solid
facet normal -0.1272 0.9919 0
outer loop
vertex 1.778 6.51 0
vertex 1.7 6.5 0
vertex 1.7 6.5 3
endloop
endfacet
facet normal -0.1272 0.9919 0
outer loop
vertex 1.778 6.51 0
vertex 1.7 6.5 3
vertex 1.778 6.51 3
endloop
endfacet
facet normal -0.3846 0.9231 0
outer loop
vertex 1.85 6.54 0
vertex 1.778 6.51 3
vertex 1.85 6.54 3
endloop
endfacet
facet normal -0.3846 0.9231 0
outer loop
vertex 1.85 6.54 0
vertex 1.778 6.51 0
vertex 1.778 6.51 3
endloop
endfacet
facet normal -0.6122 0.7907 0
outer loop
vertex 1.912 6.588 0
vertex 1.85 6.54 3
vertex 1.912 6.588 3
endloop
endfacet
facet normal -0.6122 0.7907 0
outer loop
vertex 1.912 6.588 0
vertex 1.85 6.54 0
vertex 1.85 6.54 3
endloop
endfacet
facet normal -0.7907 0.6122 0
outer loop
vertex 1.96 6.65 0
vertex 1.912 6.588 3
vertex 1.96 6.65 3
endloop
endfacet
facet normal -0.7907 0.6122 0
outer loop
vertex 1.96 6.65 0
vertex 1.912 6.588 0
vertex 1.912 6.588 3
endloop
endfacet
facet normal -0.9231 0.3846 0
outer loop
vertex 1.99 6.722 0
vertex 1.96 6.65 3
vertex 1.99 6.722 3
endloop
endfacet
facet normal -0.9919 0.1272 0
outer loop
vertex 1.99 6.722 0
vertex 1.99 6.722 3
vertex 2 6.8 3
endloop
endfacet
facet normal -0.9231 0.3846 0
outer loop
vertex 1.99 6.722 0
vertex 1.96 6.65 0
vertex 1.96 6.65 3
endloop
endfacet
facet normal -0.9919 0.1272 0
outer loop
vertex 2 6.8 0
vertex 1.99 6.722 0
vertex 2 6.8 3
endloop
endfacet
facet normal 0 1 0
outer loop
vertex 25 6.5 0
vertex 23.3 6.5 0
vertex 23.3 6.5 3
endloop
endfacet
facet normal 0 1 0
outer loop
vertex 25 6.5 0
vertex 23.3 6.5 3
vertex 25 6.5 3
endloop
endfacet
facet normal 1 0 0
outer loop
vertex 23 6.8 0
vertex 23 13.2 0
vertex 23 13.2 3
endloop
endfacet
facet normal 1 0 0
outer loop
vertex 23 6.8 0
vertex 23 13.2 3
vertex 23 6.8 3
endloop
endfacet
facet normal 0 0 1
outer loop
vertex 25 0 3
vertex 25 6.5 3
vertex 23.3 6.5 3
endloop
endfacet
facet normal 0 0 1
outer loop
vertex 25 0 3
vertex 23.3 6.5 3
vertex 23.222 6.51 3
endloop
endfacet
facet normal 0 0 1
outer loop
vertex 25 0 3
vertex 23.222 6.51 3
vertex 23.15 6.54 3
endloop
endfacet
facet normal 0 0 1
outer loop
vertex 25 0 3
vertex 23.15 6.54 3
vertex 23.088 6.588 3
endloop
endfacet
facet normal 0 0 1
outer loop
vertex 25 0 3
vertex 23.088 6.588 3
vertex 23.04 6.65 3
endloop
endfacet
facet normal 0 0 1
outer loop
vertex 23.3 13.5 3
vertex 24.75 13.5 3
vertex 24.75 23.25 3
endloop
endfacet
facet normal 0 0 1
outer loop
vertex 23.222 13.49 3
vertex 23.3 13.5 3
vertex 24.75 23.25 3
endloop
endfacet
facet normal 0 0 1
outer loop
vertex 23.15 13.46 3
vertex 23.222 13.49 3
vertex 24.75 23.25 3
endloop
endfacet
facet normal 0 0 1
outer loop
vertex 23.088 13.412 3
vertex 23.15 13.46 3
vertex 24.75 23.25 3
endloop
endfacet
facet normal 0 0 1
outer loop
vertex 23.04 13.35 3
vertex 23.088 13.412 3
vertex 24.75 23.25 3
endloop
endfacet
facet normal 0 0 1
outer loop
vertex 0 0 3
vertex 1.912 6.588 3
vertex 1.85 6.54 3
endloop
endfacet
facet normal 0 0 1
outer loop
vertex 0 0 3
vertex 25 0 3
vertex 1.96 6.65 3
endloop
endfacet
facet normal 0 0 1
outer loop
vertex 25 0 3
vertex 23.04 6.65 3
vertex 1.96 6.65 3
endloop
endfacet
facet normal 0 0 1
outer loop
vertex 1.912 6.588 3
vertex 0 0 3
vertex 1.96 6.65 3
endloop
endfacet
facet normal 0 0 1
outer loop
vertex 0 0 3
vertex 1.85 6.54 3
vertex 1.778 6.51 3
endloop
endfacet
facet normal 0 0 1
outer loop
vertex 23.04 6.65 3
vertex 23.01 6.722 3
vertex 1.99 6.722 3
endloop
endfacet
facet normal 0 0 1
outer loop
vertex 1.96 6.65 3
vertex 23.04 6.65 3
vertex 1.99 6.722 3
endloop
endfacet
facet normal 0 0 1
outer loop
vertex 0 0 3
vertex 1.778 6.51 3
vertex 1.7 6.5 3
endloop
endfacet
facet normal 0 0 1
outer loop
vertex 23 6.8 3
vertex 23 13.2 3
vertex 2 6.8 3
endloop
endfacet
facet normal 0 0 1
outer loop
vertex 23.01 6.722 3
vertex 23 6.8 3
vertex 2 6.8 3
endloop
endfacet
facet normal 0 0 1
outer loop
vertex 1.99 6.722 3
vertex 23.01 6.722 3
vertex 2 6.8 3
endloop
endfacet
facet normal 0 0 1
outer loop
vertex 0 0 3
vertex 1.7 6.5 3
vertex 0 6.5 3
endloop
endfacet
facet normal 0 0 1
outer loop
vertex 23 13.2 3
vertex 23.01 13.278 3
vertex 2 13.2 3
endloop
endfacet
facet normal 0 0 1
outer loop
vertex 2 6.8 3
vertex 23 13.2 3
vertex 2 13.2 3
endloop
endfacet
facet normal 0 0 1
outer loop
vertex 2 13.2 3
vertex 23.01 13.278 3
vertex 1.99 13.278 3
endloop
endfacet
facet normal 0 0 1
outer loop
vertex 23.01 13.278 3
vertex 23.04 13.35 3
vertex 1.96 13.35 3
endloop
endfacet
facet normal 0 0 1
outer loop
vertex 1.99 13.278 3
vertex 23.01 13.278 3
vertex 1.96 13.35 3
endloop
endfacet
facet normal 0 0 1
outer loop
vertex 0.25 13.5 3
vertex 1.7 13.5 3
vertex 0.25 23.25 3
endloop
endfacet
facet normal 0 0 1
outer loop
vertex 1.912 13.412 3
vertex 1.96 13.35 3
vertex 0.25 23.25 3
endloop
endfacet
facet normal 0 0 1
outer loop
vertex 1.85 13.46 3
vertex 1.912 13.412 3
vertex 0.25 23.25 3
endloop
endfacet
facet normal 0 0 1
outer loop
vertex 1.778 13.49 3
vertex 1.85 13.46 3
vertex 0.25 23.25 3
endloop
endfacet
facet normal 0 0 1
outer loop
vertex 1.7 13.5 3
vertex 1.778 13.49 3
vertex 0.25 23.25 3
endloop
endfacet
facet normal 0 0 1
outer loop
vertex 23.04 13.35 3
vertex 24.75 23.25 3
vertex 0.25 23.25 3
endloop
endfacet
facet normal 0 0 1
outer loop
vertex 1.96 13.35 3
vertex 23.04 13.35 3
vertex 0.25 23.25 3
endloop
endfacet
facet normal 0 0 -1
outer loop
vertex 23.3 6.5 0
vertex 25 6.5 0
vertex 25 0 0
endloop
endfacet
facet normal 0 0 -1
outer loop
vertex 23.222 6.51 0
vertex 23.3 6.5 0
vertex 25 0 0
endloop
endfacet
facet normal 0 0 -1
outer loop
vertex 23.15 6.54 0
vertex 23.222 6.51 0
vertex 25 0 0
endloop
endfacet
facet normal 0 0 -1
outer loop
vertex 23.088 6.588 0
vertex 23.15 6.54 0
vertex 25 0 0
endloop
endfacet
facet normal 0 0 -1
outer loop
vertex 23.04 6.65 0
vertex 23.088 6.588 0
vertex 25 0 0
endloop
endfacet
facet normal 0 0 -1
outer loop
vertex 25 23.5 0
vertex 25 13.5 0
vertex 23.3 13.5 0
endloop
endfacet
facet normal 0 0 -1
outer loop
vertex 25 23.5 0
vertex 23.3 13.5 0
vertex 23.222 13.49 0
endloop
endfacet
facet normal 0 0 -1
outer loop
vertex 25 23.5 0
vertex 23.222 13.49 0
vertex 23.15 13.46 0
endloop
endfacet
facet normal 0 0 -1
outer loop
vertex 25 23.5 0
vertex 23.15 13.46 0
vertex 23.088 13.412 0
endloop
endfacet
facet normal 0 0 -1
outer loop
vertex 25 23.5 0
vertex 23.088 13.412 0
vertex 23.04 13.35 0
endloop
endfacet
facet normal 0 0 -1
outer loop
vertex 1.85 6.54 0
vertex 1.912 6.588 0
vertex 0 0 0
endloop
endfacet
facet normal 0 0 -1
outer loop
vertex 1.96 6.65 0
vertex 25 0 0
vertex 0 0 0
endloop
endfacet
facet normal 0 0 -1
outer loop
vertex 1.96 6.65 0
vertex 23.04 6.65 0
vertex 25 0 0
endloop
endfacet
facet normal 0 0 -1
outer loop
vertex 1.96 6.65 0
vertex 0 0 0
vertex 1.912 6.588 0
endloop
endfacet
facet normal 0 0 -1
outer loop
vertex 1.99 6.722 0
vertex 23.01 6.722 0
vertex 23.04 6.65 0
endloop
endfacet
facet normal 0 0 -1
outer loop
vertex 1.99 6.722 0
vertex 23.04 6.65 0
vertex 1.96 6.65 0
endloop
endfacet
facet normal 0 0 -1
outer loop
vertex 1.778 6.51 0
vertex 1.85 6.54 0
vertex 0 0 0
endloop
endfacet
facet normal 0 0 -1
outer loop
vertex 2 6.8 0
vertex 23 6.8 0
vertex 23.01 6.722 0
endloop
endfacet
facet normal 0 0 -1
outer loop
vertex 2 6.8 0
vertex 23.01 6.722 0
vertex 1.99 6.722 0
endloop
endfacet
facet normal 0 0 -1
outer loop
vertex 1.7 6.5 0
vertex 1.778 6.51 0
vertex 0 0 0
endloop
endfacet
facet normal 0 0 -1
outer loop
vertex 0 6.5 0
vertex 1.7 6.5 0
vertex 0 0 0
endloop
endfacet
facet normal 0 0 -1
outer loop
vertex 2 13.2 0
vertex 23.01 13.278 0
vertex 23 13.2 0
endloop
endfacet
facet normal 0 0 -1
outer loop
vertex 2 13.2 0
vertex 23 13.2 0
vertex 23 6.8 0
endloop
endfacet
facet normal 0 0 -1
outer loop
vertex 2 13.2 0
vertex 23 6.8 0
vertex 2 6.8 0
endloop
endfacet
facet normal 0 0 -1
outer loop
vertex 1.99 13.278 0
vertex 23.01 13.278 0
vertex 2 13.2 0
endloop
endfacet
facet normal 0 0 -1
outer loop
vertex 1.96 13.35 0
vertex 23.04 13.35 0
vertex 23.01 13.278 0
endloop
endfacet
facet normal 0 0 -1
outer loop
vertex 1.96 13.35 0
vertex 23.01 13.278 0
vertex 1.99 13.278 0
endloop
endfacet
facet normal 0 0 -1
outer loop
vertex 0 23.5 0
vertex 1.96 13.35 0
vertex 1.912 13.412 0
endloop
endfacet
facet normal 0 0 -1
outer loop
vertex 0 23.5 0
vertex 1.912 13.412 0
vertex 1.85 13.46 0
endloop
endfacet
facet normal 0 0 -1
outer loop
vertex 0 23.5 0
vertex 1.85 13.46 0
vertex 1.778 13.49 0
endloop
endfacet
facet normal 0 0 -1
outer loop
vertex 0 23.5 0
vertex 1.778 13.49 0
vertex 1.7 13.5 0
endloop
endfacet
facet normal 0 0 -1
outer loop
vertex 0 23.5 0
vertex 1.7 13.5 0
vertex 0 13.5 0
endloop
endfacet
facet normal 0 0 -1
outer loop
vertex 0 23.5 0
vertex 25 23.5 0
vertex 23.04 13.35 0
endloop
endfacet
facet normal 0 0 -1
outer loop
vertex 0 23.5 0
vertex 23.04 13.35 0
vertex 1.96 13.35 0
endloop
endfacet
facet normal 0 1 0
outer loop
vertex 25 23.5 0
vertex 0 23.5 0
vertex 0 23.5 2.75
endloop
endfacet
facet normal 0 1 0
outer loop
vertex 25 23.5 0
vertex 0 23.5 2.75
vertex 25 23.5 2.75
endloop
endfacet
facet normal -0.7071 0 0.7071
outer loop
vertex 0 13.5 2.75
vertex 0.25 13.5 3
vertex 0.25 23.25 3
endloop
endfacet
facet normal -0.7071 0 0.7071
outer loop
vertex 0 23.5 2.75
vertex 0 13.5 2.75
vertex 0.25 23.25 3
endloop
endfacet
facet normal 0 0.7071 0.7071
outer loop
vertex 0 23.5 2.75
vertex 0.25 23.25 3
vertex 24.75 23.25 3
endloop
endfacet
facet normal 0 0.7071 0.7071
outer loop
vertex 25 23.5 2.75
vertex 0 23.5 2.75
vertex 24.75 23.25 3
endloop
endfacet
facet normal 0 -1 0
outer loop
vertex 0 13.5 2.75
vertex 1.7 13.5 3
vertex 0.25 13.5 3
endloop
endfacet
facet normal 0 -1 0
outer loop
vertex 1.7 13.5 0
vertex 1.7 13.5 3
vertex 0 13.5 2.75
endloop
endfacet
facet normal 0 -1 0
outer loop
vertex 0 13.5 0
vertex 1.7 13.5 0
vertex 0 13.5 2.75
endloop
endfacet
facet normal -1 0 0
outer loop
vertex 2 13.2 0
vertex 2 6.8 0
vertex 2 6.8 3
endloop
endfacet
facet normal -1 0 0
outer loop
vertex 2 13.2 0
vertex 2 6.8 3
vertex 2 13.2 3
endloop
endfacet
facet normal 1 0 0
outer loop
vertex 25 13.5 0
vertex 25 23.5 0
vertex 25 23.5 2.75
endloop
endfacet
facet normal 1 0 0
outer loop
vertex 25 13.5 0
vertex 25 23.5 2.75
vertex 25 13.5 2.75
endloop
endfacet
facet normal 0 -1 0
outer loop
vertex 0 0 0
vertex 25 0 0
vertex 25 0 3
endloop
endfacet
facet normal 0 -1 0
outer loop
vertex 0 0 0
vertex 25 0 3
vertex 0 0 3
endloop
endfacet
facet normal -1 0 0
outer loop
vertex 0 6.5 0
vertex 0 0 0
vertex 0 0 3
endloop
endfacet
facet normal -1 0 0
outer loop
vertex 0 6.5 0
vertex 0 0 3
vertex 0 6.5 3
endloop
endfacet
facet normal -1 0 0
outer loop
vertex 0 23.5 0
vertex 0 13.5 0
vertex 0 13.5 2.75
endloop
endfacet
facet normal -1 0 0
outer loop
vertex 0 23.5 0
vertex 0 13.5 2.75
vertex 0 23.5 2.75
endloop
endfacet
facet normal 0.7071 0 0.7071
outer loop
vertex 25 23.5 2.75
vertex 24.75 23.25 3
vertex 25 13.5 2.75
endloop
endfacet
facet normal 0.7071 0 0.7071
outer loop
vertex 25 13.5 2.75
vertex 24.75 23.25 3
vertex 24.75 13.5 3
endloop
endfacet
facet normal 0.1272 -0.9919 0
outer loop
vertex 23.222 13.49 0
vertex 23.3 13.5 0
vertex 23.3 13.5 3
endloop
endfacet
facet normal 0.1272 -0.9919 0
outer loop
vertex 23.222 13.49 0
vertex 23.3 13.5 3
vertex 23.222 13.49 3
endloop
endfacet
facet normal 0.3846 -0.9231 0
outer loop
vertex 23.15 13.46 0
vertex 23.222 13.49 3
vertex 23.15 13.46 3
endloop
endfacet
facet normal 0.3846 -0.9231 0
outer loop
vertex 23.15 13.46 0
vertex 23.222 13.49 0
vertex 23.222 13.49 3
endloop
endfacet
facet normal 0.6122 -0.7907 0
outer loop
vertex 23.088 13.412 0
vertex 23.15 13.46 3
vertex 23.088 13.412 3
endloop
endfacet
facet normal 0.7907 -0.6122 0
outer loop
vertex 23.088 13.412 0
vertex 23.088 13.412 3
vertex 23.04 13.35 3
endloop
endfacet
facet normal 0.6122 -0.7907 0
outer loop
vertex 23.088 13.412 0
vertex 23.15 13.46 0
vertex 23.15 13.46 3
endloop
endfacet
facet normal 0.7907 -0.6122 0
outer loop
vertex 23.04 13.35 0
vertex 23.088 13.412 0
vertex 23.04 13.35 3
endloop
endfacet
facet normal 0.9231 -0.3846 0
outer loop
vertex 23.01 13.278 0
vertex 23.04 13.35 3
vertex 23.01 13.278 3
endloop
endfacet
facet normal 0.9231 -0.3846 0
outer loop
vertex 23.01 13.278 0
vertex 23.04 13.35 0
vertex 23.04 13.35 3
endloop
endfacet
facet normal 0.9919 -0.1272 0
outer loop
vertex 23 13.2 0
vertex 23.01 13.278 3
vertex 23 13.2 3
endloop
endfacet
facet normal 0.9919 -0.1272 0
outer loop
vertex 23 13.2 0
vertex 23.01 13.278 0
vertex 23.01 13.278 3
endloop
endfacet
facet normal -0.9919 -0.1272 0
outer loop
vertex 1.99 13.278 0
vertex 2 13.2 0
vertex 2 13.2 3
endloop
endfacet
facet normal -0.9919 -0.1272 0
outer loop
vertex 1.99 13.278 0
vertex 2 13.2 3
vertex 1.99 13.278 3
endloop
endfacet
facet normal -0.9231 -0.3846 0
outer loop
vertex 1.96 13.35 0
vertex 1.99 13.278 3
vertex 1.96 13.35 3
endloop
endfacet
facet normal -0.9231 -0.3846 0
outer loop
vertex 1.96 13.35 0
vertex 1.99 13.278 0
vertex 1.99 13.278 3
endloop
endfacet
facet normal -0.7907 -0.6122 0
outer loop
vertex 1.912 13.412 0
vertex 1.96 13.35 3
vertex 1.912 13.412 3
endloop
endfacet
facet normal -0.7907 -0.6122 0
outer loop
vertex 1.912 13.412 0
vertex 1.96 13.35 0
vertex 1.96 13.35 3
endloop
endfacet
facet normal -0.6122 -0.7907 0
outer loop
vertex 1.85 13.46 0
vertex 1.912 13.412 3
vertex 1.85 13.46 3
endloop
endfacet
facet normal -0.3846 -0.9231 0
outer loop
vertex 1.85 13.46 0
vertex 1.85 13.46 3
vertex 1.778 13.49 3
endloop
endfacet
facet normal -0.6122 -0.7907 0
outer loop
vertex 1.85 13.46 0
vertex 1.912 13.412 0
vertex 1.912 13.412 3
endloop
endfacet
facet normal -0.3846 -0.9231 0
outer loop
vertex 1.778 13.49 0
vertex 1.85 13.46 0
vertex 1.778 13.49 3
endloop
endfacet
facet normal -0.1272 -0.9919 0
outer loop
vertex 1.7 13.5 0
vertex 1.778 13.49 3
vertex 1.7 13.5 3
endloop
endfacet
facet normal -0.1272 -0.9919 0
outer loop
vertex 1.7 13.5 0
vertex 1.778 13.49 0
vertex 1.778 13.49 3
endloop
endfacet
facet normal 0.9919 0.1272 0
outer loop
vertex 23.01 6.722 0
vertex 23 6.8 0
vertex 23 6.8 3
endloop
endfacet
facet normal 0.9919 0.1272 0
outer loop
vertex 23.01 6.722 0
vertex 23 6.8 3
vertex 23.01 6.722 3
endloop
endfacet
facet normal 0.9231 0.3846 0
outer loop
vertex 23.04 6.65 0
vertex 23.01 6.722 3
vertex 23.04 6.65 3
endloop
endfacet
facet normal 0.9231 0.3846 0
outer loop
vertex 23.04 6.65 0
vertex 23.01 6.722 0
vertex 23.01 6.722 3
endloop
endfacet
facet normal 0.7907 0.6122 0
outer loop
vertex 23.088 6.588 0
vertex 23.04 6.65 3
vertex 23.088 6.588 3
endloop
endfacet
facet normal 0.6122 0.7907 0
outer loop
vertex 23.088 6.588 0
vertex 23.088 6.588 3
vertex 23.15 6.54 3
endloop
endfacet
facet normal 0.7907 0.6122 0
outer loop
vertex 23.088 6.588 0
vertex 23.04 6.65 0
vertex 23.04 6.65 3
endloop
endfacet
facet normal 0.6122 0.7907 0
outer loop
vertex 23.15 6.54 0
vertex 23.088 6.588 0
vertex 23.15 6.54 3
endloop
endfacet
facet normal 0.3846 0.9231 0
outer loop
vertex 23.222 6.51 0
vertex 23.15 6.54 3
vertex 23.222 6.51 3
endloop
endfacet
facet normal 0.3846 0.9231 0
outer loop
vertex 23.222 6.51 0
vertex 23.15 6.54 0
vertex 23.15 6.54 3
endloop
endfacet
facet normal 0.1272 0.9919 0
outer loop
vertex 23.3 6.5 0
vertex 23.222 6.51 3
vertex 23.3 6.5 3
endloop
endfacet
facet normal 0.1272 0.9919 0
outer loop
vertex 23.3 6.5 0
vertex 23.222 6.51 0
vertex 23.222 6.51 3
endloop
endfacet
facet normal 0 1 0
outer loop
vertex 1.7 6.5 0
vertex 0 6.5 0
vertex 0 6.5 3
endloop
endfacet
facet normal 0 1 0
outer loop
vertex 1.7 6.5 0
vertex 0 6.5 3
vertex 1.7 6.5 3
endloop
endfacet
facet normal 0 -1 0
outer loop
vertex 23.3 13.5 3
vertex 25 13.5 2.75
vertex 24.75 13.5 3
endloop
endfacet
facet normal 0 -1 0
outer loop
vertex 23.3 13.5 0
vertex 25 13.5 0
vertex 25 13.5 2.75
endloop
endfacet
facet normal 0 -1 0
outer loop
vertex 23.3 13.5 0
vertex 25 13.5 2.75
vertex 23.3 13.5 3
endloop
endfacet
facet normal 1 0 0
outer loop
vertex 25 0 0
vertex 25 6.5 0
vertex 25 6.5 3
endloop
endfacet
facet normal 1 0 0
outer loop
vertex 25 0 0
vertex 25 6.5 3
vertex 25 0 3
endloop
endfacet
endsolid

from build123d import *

# Parameters (mm, degrees)
EXTRUDE_1_DEPTH = 3
CHAMFER_1_SIZE  = 0.25


with BuildPart() as part:
    # Эскиз1 → Бобышка-Вытянуть1 (new body)
    with BuildSketch(Plane.XY):
        with BuildLine():
            Line((0, 0), (0, 6.5))
            Line((0, 6.5), (1.7, 6.5))
            ThreePointArc((1.7, 6.5), (1.912132034, 6.587867966), (2, 6.8))
            Line((2, 6.8), (2, 13.2))
            ThreePointArc((2, 13.2), (1.912132034, 13.412132034), (1.7, 13.5))
            Line((1.7, 13.5), (0, 13.5))
            Line((0, 13.5), (0, 23.5))
            Line((0, 23.5), (25, 23.5))
            Line((25, 23.5), (25, 13.5))
            Line((25, 13.5), (23.3, 13.5))
            ThreePointArc((23.3, 13.5), (23.087867966, 13.412132034), (23, 13.2))
            Line((23, 13.2), (23, 6.8))
            ThreePointArc((23, 6.8), (23.087867966, 6.587867966), (23.3, 6.5))
            Line((23.3, 6.5), (25, 6.5))
            Line((25, 6.5), (25, 0))
            Line((25, 0), (0, 0))
        make_face()
    extrude(amount=EXTRUDE_1_DEPTH)

    # Фаска1
    chamfer_1_edges = [part.edges().sort_by_distance(p)[0] for p in [
        (25, 18.5, 3),
        (12.5, 23.5, 3),
        (0, 18.5, 3),
    ]]
    chamfer(chamfer_1_edges, length=CHAMFER_1_SIZE)


solid = part.part
